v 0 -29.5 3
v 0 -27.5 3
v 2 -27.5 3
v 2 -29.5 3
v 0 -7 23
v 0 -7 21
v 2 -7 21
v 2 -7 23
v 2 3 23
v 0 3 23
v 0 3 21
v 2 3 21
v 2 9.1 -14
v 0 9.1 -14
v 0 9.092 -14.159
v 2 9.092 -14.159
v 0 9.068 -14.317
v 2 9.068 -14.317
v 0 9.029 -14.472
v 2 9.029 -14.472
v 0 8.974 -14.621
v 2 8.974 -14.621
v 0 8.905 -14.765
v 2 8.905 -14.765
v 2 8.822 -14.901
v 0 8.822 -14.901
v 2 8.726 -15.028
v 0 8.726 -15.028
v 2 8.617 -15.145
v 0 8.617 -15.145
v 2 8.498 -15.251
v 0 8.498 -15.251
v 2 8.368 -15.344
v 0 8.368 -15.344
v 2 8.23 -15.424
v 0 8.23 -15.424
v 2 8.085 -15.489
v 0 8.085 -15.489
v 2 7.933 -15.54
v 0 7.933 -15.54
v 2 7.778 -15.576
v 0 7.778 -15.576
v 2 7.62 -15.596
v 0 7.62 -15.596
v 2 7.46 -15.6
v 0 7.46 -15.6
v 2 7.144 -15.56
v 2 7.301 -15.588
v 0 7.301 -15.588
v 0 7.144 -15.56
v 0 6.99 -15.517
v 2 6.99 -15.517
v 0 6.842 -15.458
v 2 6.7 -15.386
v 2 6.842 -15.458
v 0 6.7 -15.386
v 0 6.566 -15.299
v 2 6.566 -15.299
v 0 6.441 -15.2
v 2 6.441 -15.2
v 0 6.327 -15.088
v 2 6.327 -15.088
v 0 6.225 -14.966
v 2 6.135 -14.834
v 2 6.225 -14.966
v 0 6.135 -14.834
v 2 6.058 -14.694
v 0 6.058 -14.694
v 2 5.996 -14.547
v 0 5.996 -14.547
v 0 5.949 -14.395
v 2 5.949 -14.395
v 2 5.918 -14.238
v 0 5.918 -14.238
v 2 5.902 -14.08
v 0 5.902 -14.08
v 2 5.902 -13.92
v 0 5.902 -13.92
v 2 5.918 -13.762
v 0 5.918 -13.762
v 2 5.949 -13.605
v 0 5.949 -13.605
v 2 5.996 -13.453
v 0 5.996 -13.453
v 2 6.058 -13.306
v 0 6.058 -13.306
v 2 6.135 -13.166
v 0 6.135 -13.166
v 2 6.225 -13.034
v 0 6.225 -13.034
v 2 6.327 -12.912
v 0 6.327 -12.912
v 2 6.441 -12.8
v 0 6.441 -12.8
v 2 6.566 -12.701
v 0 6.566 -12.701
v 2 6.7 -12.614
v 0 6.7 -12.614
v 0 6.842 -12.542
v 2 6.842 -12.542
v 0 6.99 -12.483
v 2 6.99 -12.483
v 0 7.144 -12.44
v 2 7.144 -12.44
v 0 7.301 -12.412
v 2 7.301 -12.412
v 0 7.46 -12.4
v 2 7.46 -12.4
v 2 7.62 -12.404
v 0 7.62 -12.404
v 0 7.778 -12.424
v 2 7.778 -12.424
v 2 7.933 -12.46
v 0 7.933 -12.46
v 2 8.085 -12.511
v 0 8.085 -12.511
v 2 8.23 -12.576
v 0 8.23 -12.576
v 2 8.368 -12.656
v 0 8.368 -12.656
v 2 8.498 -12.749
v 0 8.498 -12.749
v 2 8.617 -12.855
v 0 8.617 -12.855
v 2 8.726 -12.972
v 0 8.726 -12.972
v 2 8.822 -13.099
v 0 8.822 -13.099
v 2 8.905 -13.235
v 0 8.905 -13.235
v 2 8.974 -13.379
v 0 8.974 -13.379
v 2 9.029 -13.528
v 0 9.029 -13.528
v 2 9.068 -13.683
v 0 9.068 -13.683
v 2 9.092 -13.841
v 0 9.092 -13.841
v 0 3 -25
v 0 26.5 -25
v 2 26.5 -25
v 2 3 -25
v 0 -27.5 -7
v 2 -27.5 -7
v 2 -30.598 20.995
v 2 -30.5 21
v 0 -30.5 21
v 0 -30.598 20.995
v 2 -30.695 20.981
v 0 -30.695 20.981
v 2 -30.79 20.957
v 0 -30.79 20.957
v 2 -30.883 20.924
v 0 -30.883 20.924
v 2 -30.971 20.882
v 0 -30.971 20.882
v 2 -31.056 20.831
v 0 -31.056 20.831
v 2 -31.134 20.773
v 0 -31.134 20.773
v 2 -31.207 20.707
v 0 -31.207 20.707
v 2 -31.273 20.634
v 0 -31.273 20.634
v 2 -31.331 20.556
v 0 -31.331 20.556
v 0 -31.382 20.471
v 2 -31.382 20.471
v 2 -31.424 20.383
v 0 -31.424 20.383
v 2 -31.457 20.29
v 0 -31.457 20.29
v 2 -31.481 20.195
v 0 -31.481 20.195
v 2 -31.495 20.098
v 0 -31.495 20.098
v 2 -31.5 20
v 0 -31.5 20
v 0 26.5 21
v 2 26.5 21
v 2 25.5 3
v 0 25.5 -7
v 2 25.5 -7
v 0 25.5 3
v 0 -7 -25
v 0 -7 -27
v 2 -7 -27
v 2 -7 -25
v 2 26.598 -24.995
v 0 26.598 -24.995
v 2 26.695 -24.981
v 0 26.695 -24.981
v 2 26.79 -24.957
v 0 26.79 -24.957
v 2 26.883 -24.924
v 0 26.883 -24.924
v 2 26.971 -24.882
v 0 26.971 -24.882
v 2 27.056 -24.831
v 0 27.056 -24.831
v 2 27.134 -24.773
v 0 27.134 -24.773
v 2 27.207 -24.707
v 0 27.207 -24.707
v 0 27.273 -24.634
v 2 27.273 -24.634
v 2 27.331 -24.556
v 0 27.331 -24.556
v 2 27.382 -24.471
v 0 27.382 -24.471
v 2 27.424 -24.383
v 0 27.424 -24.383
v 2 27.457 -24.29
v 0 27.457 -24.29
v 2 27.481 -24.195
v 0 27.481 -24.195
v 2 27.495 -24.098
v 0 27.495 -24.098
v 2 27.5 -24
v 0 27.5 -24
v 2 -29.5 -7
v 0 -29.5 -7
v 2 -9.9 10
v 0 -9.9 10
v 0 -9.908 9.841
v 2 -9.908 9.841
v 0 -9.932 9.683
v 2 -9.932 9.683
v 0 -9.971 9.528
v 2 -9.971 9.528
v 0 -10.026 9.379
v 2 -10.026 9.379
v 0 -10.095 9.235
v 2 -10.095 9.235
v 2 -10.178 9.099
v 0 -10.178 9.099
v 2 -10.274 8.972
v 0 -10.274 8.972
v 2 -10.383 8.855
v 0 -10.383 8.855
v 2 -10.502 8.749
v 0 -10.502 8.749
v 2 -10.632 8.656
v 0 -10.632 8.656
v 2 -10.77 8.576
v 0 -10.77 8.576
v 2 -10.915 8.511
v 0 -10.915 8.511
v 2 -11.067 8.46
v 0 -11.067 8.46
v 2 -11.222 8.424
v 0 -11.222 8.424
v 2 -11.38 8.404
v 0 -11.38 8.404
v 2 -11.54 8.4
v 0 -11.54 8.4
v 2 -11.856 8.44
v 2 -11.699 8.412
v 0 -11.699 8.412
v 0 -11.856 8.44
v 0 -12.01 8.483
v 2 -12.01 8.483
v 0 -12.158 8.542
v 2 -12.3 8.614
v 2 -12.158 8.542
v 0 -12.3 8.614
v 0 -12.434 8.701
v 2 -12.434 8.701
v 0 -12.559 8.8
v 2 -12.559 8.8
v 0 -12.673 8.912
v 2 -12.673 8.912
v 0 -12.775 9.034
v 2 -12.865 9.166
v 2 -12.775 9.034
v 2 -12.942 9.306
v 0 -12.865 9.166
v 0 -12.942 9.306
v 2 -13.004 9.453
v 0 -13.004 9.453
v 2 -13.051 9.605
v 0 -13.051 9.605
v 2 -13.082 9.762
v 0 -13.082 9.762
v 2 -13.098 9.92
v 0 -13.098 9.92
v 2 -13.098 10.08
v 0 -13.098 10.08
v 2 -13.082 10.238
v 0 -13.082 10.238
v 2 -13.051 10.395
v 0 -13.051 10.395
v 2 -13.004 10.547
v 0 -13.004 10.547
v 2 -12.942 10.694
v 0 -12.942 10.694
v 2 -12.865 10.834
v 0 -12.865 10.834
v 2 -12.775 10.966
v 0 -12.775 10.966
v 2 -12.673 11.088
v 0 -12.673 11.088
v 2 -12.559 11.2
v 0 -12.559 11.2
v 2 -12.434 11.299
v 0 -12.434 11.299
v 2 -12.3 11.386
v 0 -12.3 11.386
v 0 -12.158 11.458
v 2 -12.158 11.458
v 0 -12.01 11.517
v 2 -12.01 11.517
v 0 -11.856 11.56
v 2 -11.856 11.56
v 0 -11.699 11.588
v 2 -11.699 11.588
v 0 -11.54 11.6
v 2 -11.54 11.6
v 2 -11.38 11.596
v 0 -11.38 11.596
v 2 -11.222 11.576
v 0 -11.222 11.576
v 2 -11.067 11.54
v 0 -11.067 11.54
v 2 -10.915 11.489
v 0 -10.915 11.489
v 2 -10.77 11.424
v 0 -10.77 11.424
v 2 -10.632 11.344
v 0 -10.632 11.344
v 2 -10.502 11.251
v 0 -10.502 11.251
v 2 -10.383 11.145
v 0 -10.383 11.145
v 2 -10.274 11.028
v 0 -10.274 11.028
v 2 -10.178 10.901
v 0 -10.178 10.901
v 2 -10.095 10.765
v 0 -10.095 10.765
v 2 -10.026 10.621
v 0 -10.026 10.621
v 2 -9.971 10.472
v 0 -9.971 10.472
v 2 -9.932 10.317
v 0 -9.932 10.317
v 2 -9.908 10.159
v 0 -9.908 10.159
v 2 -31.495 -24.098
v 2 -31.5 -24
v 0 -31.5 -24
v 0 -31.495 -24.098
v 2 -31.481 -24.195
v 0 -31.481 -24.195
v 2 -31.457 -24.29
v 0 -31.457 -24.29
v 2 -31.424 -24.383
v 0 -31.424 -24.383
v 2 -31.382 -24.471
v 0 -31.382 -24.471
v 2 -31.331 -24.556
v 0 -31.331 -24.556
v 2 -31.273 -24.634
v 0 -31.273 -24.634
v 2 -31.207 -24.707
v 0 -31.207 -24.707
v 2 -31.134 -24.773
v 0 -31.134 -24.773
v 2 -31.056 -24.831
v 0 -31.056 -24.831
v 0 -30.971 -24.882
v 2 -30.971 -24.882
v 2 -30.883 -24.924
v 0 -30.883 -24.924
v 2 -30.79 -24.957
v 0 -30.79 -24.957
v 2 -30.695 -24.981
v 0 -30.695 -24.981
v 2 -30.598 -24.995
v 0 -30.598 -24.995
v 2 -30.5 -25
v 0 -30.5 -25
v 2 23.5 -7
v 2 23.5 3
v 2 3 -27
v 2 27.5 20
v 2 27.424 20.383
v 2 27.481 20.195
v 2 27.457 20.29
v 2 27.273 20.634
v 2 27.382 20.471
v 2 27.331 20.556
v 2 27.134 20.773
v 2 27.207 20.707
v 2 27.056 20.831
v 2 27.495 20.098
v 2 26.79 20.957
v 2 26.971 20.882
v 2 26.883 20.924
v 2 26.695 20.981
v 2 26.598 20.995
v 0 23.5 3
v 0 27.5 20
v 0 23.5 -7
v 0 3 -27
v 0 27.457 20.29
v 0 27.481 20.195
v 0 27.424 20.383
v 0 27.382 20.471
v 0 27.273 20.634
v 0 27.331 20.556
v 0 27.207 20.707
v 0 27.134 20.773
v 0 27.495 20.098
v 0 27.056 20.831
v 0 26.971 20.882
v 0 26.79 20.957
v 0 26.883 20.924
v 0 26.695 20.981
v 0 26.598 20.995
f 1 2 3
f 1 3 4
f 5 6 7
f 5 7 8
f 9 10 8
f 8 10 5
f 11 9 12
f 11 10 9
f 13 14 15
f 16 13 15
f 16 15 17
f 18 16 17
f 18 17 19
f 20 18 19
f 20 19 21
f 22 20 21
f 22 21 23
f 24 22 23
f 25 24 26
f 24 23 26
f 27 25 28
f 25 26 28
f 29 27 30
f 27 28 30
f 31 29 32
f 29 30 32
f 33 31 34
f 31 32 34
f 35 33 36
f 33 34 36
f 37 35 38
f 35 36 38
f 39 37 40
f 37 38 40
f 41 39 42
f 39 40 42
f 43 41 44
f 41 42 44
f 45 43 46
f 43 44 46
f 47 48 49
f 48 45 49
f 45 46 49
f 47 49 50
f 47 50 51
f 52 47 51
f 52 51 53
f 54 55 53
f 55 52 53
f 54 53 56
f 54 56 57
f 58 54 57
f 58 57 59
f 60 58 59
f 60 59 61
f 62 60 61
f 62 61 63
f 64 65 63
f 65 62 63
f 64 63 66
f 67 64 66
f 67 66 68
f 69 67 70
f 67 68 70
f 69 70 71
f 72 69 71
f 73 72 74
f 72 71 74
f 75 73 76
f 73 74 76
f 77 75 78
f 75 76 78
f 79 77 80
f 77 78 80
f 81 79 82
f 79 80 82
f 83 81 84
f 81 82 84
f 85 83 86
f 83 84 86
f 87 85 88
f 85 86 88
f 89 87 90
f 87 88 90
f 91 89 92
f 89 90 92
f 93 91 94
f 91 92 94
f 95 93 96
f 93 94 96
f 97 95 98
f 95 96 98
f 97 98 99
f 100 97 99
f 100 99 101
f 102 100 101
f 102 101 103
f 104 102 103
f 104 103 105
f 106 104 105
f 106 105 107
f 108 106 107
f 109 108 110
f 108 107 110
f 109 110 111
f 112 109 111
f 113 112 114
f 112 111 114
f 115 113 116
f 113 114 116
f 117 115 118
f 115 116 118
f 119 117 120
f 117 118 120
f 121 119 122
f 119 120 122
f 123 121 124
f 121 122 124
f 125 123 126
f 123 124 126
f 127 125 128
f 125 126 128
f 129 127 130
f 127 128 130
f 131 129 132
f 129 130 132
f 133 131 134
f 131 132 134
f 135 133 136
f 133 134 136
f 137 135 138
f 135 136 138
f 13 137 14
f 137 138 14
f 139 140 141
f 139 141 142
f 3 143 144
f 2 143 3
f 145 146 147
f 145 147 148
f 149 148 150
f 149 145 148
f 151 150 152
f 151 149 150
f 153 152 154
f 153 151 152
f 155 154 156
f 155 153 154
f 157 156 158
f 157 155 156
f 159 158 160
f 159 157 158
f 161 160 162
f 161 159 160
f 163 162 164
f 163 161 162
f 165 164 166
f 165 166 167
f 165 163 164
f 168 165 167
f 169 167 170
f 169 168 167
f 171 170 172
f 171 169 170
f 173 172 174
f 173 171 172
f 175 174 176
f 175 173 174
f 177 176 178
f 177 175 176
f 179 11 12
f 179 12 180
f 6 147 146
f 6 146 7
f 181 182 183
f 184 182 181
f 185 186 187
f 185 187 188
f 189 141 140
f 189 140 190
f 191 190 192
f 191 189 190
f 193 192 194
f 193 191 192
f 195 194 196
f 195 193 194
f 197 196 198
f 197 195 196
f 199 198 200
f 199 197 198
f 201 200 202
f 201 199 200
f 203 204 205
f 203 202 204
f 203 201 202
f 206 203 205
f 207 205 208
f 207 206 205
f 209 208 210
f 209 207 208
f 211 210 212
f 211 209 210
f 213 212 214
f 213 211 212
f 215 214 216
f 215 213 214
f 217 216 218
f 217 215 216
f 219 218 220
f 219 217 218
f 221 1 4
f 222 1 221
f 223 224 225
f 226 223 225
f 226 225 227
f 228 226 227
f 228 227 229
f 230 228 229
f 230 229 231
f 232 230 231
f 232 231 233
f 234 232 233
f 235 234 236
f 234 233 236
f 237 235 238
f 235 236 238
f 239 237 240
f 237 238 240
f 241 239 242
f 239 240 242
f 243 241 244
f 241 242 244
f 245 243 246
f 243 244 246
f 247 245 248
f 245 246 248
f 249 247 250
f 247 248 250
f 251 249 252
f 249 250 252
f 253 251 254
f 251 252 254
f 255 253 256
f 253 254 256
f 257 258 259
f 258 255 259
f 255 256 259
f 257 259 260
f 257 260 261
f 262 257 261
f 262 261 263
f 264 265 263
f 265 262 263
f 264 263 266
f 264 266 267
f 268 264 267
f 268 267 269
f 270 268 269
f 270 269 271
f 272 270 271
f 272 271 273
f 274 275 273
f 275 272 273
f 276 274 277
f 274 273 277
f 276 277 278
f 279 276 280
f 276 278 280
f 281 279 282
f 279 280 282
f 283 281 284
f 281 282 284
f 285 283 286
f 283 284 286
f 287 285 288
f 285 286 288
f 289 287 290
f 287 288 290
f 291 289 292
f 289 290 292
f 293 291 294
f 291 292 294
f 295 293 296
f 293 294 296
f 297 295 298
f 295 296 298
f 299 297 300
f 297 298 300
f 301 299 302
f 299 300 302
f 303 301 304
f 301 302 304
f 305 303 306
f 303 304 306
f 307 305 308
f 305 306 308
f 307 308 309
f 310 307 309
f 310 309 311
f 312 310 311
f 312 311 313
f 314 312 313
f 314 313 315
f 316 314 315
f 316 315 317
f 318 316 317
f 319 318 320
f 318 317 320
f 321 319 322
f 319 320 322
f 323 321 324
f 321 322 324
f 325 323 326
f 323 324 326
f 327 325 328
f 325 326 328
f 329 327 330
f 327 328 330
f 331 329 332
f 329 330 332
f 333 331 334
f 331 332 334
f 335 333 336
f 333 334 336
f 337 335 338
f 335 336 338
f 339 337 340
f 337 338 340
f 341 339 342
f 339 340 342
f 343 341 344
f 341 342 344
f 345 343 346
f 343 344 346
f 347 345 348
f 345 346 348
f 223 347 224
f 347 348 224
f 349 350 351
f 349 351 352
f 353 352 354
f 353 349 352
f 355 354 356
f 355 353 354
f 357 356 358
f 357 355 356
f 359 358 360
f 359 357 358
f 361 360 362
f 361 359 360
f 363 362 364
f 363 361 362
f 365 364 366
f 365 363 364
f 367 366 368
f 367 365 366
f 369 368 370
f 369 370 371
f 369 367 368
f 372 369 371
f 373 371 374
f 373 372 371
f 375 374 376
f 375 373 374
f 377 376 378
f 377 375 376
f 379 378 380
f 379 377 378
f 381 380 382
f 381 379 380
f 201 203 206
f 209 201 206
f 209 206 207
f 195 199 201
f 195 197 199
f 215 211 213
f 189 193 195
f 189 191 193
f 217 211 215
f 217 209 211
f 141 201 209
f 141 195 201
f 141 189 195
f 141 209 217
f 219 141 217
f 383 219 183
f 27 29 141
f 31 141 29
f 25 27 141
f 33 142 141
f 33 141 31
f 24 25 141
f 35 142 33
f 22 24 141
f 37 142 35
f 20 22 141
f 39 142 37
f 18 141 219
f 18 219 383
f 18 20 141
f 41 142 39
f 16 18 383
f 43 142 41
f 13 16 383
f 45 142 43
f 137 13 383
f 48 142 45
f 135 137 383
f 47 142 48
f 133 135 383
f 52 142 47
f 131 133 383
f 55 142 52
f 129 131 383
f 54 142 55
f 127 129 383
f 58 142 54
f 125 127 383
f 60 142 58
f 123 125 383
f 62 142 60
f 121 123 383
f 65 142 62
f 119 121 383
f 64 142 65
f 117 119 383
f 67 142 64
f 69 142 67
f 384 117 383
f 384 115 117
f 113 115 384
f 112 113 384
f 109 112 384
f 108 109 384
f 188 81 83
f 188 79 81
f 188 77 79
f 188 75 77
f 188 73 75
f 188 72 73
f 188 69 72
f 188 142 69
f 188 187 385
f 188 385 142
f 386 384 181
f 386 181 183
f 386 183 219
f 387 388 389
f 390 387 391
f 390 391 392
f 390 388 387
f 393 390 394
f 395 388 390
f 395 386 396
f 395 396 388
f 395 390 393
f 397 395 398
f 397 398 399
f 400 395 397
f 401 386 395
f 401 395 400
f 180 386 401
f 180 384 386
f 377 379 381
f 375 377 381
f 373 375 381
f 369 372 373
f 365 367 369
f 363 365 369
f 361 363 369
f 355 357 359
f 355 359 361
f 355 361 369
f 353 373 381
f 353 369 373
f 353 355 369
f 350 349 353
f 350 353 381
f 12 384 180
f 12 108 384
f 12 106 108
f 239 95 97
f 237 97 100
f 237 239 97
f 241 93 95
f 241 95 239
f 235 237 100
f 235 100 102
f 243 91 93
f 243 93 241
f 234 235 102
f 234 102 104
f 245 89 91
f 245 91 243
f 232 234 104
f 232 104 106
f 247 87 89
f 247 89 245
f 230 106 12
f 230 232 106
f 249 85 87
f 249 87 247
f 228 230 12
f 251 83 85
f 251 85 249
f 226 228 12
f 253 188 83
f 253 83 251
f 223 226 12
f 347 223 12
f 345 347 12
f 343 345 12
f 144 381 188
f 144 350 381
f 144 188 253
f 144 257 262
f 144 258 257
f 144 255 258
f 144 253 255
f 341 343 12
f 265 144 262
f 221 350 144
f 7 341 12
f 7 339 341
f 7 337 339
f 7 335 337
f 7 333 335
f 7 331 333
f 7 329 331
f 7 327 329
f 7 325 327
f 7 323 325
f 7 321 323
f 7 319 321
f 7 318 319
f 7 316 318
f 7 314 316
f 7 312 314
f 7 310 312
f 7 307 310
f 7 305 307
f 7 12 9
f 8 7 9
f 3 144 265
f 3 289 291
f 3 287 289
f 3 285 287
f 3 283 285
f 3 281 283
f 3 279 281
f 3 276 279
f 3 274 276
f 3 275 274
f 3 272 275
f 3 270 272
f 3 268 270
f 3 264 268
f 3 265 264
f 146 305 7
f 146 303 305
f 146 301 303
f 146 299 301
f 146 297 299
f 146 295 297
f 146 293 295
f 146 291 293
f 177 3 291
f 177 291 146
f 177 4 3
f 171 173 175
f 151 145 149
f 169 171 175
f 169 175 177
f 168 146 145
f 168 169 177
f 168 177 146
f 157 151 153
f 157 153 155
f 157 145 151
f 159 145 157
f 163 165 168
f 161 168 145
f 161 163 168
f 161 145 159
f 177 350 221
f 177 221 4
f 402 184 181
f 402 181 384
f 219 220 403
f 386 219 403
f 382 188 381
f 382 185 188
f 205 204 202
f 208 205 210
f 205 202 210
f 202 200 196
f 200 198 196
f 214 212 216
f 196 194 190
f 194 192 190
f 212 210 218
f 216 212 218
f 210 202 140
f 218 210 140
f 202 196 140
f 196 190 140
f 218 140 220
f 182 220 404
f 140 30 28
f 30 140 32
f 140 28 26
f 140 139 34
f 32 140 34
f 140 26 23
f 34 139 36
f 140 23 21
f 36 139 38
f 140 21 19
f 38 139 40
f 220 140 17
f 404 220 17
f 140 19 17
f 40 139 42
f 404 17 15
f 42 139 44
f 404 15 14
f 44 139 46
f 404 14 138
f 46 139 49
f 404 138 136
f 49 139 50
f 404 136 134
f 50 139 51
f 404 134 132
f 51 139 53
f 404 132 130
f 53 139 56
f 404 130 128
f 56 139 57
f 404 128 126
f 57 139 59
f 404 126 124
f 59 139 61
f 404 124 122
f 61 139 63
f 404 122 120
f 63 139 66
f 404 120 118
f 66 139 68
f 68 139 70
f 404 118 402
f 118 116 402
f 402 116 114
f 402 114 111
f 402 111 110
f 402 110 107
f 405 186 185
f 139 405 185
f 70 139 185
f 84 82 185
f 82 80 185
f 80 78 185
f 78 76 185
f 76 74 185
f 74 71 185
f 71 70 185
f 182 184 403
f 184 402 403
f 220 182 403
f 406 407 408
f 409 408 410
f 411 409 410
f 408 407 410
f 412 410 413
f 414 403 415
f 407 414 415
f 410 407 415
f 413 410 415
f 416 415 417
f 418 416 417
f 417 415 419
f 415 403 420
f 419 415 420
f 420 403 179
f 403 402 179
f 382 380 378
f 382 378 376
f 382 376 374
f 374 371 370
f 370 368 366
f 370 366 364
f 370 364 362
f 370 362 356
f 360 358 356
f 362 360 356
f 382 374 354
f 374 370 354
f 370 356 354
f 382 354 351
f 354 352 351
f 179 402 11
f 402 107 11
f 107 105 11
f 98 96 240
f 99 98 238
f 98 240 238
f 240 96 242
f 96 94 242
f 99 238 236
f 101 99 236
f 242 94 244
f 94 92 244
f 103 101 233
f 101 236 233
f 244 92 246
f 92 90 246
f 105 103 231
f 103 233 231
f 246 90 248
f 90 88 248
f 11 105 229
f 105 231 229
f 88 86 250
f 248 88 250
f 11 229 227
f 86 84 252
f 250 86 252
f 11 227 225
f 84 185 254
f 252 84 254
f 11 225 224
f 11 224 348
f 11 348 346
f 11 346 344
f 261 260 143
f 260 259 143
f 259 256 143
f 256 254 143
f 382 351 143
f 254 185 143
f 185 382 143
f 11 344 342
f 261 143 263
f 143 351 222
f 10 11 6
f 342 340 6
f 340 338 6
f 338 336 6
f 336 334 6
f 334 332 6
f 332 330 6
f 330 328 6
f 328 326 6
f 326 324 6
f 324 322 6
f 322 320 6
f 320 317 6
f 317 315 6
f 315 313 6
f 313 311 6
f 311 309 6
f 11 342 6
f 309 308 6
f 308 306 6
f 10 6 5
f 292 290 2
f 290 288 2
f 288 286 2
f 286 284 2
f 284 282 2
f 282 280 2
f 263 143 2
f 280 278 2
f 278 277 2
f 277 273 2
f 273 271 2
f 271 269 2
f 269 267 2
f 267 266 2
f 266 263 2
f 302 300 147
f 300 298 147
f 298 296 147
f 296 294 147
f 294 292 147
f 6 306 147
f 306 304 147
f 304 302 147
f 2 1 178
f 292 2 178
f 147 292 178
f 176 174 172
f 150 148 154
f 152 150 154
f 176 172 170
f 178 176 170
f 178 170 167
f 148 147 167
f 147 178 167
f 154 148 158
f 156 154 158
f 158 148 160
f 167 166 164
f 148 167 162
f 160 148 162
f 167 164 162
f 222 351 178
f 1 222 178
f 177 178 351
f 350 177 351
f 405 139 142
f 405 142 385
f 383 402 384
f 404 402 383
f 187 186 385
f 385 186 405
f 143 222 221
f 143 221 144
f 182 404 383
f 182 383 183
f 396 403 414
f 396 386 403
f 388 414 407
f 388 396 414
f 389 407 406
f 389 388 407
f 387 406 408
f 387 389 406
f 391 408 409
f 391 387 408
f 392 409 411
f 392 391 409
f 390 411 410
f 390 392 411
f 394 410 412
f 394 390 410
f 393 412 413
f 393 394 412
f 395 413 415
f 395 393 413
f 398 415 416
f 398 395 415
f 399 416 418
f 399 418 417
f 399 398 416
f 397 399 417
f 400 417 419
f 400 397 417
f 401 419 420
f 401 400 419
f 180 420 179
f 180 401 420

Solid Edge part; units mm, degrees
sketch "Sketch1" plane through (0, 0, 0) normal (1, 0, 0) x (0, 1, 0)
  line L0 (27.5, -27) -> (27.5, 23)
  line L1 (27.5, 23) -> (-31.5, 23)
  line L2 (-31.5, 23) -> (-31.5, -27)
  line L3 (-31.5, -27) -> (27.5, -27)
extrude "Protrusion1" add sketch "Sketch1" along normal blind 2
sketch "Sketch2" plane through (0, 0, 0) normal (1, 0, 0) x (0, 1, 0)
  line L0 (-31.5, 21) -> (-7, 21)
  line L1 (-7, 21) -> (-7, 23)
  line L2 (-7, 23) -> (-31.5, 23)
  line L3 (-31.5, 23) -> (-31.5, 21)
extrude "ExtrudedCutout_1" cut sketch "Sketch2" along normal blind 2
sketch "Sketch3" plane through (0, 0, 0) normal (1, 0, 0) x (0, 1, 0)
  line L0 (3, 21) -> (27.5, 21)
  line L1 (27.5, 21) -> (27.5, 23)
  line L2 (27.5, 23) -> (3, 23)
  line L3 (3, 23) -> (3, 21)
extrude "ExtrudedCutout_2" cut sketch "Sketch3" along normal blind 2
sketch "Sketch4" plane through (0, 0, 0) normal (1, 0, 0) x (0, 1, 0)
  line L0 (23.5, 3) -> (23.5, -7)
  line L1 (23.5, -7) -> (25.5, -7)
  line L2 (25.5, -7) -> (25.5, 3)
  line L3 (25.5, 3) -> (23.5, 3)
extrude "ExtrudedCutout_3" cut sketch "Sketch4" along normal blind 2
sketch "Sketch5" plane through (0, 0, 0) normal (1, 0, 0) x (0, 1, 0)
  line L0 (27.5, -25) -> (3, -25)
  line L1 (3, -25) -> (3, -27)
  line L2 (3, -27) -> (27.5, -27)
  line L3 (27.5, -27) -> (27.5, -25)
extrude "ExtrudedCutout_4" cut sketch "Sketch5" along normal blind 4
sketch "Sketch6" plane through (0, 0, 0) normal (1, 0, 0) x (0, 1, 0)
  line L0 (-7, -25) -> (-31.5, -25)
  line L1 (-31.5, -25) -> (-31.5, -27)
  line L2 (-31.5, -27) -> (-7, -27)
  line L3 (-7, -27) -> (-7, -25)
extrude "ExtrudedCutout_5" cut sketch "Sketch6" along normal blind 2
sketch "Sketch7" plane through (0, 0, 0) normal (1, 0, 0) x (0, 1, 0)
  line L0 (-29.5, -7) -> (-27.5, -7)
  line L1 (-27.5, -7) -> (-27.5, 3)
  line L2 (-27.5, 3) -> (-29.5, 3)
  line L3 (-29.5, 3) -> (-29.5, -7)
extrude "ExtrudedCutout_6" cut sketch "Sketch7" along normal blind 4
sketch "Sketch8" plane through (0, 0, 0) normal (1, 0, 0) x (0, 1, 0)
  circle A0 centre (-11.5, 10) radius 1.6
  circle A1 centre (7.5, -14) radius 1.6
  dimension "D1" = 3.2
  dimension "D2" = 3.2
  dimension "D3" = 3.5
  dimension "D4" = 3.5
  dimension "D5" = 3.5
  dimension "D6" = 3.5
extrude "ExtrudedCutout_7" cut sketch "Sketch8" along normal blind 2
fillet "Round_1" radius 1 4 edges at (1, 27.5, -25) (1, 27.5, 21) (1, -31.5, 21) (1, -31.5, -25)
properties material "Acrylic, high impact grade"
